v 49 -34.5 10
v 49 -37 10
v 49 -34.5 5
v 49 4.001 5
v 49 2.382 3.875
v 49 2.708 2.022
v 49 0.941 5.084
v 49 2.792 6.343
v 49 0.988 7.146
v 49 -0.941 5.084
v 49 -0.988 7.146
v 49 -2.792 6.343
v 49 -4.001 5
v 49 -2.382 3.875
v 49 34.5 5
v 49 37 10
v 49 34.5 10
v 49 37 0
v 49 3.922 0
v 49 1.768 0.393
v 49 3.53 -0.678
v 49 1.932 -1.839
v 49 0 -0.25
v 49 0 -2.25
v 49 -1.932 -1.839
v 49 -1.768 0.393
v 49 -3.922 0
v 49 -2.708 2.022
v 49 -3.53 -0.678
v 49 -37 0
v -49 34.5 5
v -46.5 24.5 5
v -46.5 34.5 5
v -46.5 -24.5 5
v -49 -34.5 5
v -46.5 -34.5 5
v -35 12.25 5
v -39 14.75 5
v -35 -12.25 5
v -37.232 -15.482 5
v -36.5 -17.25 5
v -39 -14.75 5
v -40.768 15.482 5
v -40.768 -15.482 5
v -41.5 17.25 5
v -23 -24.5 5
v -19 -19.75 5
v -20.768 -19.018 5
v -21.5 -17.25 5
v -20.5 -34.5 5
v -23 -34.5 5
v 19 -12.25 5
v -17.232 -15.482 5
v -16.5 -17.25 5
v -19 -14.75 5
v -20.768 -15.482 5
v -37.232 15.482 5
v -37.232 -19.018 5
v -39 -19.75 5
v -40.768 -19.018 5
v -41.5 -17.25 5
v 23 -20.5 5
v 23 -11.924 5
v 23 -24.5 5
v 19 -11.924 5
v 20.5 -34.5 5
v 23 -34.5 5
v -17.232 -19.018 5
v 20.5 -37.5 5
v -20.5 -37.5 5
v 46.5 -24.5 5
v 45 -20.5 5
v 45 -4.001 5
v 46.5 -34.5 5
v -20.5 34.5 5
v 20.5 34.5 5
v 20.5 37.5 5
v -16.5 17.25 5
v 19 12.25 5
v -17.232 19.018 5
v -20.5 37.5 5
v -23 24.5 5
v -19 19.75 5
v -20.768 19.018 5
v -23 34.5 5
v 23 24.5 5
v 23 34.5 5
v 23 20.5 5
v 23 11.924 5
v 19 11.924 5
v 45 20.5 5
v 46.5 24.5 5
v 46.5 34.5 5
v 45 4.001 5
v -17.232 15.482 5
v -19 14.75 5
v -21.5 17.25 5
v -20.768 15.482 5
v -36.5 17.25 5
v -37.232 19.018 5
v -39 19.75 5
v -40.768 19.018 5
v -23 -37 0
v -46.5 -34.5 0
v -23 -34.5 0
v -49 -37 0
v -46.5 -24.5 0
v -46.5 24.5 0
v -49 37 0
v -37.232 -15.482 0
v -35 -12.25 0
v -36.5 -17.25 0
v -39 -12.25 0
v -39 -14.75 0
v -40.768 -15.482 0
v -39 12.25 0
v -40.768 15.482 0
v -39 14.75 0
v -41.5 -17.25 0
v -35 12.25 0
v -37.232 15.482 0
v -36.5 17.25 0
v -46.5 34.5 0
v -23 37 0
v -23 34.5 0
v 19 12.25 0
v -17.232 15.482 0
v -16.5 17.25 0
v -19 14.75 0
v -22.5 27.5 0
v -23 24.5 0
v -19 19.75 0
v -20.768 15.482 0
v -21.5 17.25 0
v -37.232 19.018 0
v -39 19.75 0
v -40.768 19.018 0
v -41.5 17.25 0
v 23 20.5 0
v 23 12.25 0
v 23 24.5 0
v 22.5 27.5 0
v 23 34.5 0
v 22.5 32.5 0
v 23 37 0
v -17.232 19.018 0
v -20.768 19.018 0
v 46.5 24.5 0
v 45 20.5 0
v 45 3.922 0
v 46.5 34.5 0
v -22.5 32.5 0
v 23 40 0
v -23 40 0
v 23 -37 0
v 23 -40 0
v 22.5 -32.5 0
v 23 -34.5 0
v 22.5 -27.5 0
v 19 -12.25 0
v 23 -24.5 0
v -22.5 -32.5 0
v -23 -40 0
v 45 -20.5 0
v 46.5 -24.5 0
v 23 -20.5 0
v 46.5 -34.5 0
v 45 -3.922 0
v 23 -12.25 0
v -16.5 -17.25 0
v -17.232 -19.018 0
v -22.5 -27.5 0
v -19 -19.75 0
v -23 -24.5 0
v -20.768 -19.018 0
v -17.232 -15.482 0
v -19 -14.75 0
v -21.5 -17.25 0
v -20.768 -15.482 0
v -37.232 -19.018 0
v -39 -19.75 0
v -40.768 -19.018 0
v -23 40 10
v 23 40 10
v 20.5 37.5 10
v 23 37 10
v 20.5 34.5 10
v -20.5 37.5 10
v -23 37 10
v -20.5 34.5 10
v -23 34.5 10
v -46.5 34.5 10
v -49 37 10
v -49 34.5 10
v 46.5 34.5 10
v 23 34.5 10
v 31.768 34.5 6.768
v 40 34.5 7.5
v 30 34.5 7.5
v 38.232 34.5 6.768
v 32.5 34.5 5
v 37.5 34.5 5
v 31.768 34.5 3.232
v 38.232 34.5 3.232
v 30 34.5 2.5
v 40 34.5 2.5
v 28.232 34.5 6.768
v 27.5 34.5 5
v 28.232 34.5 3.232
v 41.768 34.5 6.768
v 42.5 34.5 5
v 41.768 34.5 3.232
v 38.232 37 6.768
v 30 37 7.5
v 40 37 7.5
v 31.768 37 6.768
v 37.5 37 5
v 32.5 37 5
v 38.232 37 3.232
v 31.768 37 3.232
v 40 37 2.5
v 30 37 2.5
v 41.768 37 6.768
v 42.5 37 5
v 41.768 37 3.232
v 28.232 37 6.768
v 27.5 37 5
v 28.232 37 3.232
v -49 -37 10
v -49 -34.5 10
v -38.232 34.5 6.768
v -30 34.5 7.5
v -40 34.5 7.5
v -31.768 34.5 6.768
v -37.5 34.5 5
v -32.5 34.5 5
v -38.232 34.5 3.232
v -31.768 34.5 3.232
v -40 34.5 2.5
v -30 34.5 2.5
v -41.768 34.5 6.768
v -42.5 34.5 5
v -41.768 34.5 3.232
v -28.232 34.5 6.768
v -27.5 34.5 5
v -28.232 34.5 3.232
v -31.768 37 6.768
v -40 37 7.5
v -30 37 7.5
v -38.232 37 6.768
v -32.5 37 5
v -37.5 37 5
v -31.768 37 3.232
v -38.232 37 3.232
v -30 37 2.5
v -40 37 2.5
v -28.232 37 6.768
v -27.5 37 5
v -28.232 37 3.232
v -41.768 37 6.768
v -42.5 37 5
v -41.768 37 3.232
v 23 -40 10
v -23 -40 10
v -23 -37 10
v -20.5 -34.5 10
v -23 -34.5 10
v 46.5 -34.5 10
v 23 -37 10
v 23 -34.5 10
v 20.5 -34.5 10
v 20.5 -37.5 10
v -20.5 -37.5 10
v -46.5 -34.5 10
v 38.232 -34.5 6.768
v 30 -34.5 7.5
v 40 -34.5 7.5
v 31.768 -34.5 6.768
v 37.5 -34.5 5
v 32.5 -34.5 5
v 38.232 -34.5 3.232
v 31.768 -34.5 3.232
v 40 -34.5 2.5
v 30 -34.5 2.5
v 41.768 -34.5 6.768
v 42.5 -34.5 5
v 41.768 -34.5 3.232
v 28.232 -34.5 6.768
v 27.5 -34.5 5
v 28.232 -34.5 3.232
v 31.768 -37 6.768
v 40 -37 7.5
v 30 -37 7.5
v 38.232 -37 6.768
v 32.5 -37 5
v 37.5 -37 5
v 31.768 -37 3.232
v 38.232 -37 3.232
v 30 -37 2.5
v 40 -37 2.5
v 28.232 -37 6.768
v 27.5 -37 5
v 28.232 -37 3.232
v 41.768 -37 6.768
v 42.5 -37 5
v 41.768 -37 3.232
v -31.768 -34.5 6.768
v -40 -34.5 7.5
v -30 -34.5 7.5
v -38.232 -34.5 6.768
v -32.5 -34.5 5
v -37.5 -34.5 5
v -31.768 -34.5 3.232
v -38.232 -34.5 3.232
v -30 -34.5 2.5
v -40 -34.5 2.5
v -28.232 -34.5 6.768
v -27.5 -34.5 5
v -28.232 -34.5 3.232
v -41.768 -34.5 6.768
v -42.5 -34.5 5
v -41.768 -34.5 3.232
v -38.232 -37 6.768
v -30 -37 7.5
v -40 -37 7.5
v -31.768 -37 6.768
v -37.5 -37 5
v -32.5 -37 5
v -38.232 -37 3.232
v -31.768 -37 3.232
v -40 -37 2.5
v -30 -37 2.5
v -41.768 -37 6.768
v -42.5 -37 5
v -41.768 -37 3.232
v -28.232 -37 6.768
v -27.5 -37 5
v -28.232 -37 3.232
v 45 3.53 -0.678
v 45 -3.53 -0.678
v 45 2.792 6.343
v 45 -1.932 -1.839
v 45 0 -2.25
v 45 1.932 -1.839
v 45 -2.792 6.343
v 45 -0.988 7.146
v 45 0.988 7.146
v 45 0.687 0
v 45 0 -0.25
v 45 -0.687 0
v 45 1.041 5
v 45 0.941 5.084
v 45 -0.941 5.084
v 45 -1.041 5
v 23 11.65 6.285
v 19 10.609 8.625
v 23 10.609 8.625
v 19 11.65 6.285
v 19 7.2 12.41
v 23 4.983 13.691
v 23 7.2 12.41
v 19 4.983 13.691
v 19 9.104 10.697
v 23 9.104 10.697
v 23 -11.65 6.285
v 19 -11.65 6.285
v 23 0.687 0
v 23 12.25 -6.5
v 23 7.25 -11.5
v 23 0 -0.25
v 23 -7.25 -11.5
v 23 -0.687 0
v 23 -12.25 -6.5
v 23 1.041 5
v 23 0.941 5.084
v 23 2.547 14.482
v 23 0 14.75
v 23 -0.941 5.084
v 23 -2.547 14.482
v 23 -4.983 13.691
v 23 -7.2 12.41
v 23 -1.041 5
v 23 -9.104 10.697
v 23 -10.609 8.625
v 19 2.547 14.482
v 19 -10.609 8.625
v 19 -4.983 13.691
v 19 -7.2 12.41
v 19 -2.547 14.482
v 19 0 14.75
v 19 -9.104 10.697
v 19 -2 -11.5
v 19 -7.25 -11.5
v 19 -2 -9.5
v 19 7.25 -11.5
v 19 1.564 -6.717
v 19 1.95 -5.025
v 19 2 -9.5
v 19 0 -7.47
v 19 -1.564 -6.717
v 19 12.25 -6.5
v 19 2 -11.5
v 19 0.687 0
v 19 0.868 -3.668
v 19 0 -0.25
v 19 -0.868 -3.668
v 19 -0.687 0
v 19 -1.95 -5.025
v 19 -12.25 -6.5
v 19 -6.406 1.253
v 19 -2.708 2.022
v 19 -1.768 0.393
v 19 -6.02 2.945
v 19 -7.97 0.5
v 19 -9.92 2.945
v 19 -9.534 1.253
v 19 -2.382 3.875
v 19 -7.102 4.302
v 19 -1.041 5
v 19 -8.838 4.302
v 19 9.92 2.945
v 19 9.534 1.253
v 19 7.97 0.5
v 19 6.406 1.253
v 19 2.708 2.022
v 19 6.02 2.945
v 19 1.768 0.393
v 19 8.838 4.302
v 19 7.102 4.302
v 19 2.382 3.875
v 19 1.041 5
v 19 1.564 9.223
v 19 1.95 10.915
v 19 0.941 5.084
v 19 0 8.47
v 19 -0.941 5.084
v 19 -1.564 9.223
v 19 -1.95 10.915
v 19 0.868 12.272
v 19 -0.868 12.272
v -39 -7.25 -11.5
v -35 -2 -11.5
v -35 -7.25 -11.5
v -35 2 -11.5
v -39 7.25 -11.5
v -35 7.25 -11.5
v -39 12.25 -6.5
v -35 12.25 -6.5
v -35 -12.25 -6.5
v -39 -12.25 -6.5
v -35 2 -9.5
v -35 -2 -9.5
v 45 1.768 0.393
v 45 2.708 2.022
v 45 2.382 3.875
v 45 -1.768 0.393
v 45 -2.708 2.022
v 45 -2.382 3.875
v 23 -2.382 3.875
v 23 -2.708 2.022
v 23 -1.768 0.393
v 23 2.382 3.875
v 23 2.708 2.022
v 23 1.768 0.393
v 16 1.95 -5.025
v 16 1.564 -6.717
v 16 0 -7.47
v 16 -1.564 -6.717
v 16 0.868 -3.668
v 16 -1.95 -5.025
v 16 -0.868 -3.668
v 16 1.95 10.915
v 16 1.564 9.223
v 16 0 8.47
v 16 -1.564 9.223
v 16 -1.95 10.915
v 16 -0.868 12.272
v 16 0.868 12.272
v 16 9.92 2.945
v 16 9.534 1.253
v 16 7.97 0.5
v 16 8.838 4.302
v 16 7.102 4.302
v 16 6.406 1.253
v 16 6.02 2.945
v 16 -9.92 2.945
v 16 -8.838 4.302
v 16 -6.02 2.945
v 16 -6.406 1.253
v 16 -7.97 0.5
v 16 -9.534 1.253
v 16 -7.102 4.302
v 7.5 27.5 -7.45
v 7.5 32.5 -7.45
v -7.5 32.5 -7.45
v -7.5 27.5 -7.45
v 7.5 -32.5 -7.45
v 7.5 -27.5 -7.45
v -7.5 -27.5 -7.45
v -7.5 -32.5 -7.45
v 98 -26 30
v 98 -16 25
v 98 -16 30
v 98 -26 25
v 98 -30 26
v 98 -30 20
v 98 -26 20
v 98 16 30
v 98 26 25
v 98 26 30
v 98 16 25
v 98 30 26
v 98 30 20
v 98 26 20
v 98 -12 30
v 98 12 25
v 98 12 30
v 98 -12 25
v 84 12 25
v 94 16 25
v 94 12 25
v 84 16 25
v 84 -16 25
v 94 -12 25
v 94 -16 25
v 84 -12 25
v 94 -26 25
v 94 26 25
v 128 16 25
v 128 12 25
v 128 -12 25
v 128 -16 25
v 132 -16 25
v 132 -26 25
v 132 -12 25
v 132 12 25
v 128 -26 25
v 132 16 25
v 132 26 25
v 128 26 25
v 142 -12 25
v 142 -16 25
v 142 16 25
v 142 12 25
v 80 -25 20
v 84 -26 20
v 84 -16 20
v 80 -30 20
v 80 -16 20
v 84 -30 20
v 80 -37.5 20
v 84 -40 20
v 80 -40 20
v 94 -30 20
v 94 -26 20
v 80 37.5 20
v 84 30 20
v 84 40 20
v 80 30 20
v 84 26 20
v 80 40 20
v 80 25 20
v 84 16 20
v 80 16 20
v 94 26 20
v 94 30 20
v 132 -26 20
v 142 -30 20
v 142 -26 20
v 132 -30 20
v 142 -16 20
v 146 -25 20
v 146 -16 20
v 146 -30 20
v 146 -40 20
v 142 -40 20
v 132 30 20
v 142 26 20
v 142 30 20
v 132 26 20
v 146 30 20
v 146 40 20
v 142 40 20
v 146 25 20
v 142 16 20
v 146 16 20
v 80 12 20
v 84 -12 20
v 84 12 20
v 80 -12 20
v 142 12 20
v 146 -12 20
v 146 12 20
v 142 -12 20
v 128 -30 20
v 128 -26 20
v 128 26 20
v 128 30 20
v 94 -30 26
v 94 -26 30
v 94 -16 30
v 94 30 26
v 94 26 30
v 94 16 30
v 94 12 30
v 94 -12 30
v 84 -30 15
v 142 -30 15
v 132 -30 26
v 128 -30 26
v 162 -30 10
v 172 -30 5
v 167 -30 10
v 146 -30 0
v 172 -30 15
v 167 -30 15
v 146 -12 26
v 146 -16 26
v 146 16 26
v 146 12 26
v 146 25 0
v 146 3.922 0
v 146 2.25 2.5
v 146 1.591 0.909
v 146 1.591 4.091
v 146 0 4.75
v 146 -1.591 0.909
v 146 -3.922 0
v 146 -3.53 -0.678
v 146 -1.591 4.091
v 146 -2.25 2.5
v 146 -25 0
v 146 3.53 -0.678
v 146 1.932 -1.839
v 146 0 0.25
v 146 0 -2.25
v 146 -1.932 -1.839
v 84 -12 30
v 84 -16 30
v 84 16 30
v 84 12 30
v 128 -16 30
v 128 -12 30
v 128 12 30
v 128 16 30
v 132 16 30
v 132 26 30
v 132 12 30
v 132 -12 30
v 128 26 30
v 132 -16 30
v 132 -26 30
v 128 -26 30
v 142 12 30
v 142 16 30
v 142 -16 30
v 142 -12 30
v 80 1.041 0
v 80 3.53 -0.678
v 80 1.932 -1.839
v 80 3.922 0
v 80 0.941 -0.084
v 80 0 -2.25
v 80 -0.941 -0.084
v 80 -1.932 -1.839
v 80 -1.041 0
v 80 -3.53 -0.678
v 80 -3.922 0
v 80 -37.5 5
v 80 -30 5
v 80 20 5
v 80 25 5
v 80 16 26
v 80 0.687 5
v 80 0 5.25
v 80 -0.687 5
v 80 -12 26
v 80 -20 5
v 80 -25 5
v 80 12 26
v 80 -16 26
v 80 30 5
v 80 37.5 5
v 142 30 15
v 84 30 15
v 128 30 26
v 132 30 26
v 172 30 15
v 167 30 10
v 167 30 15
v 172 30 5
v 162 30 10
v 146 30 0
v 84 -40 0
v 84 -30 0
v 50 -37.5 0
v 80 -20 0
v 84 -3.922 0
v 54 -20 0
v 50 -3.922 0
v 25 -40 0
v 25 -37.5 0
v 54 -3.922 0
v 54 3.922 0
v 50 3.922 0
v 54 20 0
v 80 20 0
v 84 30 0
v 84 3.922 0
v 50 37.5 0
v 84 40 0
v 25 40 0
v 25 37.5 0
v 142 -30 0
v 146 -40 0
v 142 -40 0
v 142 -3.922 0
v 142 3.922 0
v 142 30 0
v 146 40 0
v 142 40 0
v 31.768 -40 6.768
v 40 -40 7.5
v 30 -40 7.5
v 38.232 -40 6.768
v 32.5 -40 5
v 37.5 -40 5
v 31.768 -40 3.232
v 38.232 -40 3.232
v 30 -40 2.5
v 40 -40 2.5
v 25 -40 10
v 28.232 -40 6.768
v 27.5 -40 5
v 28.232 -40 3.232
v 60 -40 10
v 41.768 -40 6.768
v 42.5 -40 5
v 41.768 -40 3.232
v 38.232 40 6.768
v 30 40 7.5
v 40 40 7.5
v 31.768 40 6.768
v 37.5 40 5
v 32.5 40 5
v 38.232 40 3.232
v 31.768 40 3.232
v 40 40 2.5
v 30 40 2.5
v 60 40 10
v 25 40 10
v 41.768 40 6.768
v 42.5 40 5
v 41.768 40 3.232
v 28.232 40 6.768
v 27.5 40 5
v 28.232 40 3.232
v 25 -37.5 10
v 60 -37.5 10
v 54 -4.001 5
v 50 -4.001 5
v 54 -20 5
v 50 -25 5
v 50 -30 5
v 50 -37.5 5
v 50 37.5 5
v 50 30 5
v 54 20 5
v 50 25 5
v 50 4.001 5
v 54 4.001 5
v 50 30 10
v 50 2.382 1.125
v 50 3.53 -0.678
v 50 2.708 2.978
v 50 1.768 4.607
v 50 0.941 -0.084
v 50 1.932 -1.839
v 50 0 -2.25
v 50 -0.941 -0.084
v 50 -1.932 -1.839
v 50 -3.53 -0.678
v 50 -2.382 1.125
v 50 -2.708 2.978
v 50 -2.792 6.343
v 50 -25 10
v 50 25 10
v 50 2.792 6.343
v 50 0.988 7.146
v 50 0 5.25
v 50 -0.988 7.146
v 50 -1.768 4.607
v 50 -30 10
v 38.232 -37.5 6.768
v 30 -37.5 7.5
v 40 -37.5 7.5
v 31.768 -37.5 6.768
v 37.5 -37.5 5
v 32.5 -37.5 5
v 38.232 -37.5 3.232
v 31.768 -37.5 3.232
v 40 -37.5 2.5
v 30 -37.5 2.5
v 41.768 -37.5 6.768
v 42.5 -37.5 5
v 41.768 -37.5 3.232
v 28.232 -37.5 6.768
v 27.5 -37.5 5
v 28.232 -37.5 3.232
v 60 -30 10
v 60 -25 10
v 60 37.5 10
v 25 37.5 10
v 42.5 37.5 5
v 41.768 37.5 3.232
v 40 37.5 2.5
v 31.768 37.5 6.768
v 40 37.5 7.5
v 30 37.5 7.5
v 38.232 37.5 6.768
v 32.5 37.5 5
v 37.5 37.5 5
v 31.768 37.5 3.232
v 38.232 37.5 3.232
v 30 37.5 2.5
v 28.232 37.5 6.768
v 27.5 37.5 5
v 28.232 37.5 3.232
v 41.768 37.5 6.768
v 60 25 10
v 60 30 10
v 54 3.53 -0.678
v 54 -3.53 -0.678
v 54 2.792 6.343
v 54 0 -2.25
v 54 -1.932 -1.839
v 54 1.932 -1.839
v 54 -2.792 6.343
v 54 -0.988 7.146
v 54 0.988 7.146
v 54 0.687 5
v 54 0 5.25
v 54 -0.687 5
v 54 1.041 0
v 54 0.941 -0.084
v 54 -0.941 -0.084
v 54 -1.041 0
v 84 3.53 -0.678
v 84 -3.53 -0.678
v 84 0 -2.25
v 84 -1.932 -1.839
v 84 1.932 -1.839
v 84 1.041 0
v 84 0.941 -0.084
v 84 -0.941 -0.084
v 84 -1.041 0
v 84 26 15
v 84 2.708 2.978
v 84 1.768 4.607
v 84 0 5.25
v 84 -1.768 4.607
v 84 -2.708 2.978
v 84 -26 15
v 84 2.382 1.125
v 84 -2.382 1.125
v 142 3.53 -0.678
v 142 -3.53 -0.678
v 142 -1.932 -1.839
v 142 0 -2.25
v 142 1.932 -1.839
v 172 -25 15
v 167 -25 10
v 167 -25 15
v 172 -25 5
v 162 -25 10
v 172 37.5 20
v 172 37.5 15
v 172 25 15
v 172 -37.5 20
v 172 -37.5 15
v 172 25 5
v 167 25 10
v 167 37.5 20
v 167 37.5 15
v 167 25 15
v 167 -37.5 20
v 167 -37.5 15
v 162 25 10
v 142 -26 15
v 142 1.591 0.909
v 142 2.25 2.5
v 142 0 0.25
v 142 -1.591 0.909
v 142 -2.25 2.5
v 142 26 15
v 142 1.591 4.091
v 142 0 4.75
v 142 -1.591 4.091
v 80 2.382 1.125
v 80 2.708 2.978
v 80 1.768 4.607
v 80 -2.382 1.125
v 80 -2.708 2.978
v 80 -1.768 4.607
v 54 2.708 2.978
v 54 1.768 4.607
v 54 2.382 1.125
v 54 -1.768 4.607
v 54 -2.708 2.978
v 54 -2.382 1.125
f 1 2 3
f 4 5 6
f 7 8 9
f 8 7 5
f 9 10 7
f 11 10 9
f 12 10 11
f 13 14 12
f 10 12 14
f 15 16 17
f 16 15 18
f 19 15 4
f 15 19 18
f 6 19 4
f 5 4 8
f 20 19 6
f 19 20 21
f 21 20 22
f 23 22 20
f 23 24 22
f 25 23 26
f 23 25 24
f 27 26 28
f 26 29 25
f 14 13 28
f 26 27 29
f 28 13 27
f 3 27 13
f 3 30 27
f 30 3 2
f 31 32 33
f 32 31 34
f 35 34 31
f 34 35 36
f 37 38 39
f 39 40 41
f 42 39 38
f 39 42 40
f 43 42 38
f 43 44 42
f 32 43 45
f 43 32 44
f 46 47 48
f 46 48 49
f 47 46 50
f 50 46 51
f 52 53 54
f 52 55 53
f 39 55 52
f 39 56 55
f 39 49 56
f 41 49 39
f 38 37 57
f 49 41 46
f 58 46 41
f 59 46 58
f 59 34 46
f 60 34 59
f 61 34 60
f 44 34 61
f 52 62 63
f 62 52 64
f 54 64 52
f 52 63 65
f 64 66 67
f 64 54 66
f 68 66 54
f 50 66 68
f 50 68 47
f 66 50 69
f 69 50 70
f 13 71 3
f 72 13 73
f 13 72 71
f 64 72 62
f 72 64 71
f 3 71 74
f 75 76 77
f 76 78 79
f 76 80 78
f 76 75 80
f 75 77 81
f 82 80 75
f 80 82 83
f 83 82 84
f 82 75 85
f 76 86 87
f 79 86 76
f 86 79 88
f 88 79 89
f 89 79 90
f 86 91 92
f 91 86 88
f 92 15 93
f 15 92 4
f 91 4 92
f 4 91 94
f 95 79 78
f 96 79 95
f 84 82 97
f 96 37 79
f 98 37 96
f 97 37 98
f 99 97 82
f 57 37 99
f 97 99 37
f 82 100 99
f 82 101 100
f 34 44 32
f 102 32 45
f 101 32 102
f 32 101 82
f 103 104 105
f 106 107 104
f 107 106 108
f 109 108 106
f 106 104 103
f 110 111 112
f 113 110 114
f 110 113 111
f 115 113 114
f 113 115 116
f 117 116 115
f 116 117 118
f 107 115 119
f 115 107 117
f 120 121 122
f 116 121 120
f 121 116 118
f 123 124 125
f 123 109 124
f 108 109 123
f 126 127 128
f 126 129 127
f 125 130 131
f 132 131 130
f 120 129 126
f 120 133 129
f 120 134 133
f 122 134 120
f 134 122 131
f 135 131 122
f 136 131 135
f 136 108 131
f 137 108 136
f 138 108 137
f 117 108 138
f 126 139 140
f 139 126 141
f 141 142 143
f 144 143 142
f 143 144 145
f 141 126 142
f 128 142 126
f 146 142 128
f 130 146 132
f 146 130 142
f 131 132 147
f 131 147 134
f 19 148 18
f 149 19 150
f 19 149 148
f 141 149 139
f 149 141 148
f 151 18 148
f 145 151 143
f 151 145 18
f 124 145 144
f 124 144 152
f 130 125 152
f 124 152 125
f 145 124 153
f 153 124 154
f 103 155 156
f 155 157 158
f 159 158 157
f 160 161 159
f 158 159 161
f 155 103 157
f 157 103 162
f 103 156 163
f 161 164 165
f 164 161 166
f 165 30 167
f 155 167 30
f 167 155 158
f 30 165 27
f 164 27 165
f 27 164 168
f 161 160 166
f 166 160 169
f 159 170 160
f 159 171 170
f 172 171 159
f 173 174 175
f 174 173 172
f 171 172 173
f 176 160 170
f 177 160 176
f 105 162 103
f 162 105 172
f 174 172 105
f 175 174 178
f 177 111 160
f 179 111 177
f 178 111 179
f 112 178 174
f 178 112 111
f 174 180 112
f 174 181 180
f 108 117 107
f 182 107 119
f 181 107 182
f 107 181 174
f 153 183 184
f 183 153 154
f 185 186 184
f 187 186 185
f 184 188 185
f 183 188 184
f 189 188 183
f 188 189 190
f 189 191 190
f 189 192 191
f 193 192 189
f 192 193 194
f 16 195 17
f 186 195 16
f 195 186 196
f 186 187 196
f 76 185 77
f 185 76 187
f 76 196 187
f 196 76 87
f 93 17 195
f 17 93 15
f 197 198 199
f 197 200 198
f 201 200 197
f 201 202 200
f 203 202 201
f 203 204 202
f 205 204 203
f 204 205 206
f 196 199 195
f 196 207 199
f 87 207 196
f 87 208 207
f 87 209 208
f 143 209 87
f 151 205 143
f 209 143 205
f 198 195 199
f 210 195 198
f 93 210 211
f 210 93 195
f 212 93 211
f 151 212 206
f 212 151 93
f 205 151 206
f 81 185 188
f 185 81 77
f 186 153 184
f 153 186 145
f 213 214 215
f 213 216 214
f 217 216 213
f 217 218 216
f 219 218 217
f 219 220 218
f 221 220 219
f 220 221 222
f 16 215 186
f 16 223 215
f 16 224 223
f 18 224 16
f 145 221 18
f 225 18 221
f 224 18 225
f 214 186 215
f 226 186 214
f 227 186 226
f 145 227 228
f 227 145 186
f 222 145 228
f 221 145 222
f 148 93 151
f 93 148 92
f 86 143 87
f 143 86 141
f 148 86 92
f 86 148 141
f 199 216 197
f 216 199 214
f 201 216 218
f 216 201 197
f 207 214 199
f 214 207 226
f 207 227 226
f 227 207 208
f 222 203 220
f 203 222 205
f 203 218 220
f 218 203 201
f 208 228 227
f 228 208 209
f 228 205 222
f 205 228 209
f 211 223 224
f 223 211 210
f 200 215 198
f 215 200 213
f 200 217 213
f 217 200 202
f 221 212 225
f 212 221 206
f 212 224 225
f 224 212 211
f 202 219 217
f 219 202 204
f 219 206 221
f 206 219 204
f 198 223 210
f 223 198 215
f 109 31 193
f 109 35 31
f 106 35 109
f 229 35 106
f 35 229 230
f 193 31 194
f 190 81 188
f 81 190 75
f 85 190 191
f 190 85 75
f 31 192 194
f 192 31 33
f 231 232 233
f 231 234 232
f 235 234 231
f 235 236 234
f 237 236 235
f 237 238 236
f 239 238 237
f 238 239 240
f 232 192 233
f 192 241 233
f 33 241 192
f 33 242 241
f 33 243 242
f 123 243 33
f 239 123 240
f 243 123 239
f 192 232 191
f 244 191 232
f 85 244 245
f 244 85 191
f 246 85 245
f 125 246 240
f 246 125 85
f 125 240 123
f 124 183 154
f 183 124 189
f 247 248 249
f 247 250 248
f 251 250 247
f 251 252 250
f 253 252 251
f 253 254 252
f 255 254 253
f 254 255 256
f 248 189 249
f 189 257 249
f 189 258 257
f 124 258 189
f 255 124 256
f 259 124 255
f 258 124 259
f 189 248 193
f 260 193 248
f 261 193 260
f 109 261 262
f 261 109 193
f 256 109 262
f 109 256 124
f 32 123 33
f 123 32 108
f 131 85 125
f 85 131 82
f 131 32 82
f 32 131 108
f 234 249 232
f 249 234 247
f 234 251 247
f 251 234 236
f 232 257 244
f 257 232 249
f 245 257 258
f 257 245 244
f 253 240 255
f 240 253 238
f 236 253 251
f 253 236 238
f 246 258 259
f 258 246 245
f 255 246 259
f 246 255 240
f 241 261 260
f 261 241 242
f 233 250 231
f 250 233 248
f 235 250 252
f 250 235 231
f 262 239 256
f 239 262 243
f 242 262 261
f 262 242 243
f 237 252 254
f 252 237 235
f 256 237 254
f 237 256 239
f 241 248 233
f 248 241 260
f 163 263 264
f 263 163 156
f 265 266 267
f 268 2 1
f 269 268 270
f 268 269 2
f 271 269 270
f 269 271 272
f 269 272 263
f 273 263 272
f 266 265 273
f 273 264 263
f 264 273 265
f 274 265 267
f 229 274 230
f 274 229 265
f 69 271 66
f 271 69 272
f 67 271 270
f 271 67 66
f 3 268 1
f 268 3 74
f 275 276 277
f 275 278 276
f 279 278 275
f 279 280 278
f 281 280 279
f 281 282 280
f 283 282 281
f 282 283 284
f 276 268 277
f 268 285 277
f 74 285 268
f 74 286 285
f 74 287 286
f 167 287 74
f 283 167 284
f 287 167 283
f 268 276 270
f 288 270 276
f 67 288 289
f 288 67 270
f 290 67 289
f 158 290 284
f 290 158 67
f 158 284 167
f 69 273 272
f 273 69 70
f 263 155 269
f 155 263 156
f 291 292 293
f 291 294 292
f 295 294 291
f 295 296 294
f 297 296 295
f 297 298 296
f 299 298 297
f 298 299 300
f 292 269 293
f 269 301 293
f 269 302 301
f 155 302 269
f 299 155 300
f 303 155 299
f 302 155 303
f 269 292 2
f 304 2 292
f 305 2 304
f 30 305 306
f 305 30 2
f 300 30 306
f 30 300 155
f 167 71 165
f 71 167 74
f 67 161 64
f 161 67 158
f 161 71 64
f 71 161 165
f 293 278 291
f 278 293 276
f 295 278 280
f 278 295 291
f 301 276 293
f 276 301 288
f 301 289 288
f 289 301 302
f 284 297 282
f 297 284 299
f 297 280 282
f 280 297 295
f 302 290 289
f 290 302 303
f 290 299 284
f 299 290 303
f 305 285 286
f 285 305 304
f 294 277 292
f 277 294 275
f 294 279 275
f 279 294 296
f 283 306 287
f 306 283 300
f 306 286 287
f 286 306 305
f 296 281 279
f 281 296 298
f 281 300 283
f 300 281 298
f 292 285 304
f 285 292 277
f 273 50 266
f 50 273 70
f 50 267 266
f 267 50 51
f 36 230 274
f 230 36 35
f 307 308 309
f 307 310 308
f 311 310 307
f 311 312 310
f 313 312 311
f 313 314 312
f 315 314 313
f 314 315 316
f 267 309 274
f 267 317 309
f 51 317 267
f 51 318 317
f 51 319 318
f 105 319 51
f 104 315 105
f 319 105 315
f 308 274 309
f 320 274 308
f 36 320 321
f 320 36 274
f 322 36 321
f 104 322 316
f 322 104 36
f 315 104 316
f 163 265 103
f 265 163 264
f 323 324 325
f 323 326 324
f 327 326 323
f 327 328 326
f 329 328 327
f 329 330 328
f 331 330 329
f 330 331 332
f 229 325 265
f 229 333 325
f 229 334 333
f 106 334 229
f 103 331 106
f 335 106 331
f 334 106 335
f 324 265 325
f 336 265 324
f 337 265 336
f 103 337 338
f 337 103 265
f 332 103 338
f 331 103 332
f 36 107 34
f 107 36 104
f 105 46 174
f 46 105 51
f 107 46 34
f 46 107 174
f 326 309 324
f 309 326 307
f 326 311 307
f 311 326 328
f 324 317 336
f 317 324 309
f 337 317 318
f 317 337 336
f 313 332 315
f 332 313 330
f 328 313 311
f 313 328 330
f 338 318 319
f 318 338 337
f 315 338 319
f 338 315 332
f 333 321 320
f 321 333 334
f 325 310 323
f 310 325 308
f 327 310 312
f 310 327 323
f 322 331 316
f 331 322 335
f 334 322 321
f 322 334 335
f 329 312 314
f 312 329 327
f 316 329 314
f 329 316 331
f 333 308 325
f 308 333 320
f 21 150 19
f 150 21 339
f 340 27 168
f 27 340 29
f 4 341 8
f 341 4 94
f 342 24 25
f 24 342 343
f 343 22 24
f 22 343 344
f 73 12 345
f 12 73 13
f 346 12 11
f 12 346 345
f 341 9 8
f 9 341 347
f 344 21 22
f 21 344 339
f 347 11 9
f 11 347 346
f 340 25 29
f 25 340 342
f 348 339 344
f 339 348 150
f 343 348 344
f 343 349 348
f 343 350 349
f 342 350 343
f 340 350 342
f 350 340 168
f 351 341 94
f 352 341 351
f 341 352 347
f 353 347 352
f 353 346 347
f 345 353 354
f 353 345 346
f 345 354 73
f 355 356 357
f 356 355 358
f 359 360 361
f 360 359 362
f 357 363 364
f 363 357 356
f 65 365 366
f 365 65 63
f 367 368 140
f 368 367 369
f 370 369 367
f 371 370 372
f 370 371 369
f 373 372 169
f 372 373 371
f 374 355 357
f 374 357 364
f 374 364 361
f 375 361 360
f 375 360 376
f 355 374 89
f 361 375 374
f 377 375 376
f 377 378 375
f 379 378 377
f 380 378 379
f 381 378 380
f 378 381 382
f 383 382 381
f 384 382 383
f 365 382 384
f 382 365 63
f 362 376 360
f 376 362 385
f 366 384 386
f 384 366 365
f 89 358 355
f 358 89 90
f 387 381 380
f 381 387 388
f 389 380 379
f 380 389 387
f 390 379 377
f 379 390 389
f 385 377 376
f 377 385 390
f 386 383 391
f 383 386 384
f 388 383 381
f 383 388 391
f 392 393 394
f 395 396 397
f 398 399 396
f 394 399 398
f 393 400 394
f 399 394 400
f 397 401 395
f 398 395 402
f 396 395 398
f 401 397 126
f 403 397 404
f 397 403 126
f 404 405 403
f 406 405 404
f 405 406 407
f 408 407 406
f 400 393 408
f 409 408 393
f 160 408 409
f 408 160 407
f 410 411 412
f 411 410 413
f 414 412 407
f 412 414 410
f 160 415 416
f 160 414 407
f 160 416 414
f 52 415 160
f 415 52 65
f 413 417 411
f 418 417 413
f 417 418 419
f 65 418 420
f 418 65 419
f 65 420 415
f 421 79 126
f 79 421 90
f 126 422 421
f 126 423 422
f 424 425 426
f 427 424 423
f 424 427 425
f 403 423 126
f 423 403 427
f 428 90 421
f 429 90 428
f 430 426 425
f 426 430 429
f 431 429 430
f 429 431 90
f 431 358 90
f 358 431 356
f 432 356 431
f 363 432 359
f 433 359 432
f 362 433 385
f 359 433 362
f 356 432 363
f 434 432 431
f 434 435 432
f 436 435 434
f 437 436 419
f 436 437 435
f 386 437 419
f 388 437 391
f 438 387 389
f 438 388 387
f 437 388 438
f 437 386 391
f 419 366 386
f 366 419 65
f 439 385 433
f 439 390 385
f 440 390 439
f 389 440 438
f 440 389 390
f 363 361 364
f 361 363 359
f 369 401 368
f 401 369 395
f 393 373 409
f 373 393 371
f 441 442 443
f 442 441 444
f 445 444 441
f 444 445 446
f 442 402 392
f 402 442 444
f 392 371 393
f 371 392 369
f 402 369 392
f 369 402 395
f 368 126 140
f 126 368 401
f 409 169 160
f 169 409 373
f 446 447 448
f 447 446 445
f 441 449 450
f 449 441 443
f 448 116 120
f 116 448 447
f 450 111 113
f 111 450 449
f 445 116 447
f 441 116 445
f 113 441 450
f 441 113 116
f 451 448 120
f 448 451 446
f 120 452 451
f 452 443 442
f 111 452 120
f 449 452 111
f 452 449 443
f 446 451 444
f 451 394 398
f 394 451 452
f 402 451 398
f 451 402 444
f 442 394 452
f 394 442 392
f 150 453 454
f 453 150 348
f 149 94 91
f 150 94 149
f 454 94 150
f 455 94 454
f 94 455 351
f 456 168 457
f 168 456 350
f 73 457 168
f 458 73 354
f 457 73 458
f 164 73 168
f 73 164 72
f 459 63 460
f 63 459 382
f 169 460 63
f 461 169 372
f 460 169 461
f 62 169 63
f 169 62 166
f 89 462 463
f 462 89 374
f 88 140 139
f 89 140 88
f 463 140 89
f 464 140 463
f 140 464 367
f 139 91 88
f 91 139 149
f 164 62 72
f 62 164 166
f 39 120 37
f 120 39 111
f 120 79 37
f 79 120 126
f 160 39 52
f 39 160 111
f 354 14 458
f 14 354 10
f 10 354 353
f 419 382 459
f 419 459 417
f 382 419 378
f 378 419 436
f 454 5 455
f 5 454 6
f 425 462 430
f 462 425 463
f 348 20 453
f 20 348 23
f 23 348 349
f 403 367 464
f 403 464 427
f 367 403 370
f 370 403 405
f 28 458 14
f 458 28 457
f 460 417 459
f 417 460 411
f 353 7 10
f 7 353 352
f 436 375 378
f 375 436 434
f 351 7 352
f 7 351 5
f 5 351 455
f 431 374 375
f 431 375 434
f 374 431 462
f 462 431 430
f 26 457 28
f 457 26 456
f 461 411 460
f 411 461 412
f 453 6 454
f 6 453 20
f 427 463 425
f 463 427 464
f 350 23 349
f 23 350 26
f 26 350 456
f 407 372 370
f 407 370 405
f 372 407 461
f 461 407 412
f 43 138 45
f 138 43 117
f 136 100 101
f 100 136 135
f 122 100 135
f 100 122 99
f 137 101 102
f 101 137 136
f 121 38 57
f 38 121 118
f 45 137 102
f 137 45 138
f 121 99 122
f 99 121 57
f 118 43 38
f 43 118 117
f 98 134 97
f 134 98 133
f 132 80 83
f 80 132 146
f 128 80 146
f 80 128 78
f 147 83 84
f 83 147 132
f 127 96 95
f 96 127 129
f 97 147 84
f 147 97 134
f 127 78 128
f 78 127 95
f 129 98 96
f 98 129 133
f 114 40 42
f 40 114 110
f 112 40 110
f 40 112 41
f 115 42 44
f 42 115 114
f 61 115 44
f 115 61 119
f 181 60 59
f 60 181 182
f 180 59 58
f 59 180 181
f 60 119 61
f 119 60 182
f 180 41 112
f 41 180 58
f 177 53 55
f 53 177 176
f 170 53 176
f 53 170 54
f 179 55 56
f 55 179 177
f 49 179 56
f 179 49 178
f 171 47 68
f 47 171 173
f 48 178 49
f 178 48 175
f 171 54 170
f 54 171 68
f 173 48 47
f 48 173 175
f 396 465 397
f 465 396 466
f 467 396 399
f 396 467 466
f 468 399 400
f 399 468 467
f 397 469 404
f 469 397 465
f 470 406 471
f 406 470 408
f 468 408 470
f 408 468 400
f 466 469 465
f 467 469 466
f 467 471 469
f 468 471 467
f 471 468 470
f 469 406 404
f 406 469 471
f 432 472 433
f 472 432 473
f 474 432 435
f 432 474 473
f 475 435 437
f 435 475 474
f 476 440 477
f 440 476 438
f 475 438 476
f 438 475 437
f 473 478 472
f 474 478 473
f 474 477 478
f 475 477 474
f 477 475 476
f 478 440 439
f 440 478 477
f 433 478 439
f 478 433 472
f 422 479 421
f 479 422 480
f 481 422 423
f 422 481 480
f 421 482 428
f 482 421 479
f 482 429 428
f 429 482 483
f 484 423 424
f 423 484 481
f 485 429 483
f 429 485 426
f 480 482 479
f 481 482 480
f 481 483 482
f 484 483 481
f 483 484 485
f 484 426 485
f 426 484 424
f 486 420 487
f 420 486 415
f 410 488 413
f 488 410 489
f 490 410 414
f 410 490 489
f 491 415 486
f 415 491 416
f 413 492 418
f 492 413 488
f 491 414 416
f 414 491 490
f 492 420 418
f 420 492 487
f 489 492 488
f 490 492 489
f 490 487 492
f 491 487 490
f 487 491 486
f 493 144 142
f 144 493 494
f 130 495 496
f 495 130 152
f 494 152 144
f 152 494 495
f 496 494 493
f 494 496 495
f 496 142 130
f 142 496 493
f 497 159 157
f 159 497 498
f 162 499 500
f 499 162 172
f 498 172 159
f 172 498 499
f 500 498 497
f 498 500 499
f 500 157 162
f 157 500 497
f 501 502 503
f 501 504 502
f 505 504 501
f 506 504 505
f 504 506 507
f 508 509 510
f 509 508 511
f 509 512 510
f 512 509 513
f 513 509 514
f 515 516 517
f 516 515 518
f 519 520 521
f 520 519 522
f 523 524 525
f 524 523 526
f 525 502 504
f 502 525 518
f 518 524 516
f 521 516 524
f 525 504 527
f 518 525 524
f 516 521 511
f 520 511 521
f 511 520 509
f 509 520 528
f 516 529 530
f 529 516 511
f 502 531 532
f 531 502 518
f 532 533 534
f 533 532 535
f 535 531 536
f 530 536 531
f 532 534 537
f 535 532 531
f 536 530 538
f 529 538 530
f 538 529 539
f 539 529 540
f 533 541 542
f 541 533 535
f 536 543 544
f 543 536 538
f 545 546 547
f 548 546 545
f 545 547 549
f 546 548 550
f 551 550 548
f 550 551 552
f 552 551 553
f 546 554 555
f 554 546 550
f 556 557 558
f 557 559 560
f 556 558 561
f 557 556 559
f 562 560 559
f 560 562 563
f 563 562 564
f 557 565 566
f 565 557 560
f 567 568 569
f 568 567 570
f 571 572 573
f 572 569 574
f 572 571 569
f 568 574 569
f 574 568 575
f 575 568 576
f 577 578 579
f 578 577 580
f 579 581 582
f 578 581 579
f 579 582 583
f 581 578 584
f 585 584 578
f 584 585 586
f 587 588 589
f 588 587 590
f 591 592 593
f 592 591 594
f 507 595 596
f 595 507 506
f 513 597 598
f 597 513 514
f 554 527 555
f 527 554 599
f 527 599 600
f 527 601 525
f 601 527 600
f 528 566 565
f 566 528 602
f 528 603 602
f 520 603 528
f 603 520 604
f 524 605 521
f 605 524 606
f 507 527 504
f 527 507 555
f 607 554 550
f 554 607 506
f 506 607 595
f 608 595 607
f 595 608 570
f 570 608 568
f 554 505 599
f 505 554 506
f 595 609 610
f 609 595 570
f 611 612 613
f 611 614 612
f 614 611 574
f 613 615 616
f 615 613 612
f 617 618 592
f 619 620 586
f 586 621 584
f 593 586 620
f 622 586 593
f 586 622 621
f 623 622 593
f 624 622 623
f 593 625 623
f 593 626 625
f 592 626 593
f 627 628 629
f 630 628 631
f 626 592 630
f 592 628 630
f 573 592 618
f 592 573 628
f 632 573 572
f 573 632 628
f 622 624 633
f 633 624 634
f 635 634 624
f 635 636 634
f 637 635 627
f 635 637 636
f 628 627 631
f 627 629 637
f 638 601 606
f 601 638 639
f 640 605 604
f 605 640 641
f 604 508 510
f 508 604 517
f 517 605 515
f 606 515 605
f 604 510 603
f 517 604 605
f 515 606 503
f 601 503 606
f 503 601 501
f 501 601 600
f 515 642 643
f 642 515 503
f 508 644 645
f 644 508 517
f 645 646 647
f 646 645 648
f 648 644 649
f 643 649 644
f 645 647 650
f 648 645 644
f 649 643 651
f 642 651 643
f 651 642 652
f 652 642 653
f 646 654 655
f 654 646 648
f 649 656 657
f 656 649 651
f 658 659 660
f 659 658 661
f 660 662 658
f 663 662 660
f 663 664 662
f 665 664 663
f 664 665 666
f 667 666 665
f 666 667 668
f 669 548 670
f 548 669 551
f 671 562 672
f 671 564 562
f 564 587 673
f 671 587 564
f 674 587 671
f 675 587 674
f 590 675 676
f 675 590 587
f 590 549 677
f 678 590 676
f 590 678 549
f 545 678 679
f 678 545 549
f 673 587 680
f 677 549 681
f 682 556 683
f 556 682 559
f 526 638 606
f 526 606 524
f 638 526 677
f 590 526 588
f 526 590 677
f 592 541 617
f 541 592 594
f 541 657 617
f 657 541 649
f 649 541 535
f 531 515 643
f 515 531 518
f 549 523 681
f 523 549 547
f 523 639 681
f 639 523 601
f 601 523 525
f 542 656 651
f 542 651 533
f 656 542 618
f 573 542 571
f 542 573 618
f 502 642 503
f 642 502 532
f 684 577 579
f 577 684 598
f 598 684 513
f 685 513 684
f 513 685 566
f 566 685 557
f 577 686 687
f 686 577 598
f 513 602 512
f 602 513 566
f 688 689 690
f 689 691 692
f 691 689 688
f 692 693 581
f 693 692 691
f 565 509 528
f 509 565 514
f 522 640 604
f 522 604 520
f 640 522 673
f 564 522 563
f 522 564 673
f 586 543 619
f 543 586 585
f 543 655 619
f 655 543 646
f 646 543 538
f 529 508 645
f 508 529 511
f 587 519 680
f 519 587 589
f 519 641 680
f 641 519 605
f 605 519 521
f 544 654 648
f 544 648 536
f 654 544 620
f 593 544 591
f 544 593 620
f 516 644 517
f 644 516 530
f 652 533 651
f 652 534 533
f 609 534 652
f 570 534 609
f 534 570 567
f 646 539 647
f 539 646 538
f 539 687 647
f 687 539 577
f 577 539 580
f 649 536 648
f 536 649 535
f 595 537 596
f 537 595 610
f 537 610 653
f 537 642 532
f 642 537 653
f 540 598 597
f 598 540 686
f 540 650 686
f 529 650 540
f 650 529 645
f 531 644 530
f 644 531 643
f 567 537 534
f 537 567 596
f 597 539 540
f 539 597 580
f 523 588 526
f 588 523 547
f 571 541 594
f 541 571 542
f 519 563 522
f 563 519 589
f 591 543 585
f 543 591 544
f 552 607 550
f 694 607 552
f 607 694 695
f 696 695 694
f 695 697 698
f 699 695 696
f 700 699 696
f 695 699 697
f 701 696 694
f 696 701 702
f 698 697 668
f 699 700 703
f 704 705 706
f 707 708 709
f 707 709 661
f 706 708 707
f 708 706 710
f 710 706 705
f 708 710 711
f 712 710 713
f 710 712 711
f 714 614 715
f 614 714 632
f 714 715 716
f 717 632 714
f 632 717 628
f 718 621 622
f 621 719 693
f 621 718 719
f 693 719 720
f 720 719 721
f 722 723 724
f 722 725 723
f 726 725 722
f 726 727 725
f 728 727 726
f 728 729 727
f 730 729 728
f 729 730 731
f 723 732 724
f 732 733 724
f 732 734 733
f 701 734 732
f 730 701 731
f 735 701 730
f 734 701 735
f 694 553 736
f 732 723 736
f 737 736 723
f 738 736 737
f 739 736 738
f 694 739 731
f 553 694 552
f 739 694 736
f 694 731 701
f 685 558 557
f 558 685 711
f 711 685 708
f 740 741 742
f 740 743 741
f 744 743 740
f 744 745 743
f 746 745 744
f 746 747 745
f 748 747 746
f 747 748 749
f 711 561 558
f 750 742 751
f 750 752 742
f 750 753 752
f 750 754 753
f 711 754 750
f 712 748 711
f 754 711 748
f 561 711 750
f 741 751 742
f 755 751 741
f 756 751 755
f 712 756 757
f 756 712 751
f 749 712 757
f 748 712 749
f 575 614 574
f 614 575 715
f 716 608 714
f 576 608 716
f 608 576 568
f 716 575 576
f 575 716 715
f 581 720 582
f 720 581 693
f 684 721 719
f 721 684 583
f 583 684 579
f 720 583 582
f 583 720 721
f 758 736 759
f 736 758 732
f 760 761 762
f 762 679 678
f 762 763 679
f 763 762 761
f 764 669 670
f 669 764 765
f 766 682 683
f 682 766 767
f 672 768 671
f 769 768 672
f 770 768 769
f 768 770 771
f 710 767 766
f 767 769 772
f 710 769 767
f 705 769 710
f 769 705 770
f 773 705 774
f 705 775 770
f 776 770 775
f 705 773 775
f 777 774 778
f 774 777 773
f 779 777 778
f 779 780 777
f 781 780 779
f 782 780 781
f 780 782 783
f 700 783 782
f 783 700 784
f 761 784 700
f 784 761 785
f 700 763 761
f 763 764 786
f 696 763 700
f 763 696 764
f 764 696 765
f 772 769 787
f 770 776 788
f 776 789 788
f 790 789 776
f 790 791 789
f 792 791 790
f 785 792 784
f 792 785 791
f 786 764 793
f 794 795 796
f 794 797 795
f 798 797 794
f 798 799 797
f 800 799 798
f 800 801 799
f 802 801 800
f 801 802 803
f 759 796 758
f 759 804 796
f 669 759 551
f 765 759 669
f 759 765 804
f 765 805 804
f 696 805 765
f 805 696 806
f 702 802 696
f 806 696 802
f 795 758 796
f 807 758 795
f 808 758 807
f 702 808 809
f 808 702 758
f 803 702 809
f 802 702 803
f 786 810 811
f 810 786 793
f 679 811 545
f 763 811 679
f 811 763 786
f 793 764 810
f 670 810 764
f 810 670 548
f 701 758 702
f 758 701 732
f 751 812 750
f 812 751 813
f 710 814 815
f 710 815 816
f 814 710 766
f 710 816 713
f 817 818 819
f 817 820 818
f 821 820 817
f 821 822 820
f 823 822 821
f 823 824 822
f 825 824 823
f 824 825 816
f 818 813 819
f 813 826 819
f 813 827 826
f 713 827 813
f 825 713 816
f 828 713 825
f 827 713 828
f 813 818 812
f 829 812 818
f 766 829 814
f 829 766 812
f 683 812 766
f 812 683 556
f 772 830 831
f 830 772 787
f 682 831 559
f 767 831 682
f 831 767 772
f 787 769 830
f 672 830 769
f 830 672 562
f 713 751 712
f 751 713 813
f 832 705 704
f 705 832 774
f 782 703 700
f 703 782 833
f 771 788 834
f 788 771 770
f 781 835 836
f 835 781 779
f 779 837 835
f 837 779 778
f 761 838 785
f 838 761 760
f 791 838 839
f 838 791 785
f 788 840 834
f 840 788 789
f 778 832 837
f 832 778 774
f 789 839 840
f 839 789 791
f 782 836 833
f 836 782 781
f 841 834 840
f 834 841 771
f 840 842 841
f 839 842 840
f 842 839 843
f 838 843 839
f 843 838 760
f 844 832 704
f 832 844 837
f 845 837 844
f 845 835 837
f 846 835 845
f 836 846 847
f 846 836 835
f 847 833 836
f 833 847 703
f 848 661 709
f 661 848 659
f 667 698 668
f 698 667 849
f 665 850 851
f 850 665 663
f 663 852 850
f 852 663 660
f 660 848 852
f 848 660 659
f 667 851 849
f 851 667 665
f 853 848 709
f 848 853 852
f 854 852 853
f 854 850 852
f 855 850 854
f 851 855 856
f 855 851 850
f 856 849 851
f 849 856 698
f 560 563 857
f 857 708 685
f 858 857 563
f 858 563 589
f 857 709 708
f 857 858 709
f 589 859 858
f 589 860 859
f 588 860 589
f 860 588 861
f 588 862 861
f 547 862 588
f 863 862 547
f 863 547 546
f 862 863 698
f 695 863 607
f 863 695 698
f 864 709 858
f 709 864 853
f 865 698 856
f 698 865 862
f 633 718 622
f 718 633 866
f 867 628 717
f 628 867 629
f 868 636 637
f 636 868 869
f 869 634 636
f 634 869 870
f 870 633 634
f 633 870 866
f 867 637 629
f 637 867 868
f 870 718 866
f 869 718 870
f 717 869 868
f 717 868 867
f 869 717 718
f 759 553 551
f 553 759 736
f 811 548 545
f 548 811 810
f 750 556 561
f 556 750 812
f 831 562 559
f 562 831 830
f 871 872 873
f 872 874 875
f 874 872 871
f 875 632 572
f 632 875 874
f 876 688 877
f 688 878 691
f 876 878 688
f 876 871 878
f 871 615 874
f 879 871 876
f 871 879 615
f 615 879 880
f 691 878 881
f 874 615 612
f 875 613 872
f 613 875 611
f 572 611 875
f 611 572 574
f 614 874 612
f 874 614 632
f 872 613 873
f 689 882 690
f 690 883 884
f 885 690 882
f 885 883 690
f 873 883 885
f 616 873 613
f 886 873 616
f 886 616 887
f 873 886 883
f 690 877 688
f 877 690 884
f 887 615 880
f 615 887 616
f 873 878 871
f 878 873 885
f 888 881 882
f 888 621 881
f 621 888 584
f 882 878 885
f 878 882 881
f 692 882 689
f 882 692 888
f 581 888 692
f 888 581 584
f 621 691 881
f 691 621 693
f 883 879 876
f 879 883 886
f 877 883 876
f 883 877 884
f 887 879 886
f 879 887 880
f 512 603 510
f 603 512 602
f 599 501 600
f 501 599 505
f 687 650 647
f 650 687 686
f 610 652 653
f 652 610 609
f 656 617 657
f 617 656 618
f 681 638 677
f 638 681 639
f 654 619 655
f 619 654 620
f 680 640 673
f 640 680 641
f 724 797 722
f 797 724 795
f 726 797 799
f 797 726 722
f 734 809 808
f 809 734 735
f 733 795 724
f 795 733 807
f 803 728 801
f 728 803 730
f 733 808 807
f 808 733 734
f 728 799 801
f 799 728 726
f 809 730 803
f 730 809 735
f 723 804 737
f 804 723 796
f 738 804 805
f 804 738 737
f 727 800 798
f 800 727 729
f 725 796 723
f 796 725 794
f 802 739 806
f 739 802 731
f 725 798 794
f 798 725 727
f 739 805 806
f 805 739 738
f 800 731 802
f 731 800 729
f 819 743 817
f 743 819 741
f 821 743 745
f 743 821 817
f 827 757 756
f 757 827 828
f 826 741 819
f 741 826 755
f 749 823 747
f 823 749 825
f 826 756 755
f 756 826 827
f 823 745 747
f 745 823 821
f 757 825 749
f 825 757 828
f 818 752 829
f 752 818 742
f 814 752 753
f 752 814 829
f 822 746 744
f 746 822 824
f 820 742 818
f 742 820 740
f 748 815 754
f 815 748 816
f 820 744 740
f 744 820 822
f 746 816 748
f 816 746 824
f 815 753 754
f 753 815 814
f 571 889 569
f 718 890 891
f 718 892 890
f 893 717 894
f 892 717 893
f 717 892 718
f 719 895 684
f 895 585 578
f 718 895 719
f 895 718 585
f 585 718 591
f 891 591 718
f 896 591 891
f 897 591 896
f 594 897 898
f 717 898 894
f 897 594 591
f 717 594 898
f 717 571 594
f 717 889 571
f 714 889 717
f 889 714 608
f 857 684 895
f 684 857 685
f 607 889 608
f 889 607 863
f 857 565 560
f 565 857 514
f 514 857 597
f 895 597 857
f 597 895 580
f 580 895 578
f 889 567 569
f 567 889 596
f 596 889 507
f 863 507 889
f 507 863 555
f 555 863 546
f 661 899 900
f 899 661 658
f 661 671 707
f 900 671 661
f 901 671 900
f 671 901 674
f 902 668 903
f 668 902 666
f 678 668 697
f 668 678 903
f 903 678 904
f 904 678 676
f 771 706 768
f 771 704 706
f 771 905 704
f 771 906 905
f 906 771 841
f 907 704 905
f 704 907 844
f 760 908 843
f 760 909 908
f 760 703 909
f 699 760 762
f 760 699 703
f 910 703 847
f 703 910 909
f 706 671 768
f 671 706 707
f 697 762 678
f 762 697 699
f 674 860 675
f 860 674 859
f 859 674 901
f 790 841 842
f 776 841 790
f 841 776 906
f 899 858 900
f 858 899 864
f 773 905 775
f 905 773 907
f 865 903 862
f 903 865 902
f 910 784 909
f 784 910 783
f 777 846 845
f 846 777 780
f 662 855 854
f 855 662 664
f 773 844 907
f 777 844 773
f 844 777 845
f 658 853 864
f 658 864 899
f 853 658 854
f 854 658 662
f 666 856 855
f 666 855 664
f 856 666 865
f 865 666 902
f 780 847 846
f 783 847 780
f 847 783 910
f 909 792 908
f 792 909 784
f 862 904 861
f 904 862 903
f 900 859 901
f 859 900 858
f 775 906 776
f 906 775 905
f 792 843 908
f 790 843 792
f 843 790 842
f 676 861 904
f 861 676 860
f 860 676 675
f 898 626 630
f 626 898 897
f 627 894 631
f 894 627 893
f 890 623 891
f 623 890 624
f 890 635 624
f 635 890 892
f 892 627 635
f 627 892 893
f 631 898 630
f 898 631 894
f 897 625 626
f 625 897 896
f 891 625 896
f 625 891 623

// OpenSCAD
/*
 * Copyright (c) 2026 Patrick Charon
 * Licensed under CERN-OHL-P <https://cern-ohl.web.cern.ch/>
*/

use <parts/center_frame.scad>
use <parts/rear_frame.scad>

center_frame();

translate([113, 0, 0])
    rear_frame();
